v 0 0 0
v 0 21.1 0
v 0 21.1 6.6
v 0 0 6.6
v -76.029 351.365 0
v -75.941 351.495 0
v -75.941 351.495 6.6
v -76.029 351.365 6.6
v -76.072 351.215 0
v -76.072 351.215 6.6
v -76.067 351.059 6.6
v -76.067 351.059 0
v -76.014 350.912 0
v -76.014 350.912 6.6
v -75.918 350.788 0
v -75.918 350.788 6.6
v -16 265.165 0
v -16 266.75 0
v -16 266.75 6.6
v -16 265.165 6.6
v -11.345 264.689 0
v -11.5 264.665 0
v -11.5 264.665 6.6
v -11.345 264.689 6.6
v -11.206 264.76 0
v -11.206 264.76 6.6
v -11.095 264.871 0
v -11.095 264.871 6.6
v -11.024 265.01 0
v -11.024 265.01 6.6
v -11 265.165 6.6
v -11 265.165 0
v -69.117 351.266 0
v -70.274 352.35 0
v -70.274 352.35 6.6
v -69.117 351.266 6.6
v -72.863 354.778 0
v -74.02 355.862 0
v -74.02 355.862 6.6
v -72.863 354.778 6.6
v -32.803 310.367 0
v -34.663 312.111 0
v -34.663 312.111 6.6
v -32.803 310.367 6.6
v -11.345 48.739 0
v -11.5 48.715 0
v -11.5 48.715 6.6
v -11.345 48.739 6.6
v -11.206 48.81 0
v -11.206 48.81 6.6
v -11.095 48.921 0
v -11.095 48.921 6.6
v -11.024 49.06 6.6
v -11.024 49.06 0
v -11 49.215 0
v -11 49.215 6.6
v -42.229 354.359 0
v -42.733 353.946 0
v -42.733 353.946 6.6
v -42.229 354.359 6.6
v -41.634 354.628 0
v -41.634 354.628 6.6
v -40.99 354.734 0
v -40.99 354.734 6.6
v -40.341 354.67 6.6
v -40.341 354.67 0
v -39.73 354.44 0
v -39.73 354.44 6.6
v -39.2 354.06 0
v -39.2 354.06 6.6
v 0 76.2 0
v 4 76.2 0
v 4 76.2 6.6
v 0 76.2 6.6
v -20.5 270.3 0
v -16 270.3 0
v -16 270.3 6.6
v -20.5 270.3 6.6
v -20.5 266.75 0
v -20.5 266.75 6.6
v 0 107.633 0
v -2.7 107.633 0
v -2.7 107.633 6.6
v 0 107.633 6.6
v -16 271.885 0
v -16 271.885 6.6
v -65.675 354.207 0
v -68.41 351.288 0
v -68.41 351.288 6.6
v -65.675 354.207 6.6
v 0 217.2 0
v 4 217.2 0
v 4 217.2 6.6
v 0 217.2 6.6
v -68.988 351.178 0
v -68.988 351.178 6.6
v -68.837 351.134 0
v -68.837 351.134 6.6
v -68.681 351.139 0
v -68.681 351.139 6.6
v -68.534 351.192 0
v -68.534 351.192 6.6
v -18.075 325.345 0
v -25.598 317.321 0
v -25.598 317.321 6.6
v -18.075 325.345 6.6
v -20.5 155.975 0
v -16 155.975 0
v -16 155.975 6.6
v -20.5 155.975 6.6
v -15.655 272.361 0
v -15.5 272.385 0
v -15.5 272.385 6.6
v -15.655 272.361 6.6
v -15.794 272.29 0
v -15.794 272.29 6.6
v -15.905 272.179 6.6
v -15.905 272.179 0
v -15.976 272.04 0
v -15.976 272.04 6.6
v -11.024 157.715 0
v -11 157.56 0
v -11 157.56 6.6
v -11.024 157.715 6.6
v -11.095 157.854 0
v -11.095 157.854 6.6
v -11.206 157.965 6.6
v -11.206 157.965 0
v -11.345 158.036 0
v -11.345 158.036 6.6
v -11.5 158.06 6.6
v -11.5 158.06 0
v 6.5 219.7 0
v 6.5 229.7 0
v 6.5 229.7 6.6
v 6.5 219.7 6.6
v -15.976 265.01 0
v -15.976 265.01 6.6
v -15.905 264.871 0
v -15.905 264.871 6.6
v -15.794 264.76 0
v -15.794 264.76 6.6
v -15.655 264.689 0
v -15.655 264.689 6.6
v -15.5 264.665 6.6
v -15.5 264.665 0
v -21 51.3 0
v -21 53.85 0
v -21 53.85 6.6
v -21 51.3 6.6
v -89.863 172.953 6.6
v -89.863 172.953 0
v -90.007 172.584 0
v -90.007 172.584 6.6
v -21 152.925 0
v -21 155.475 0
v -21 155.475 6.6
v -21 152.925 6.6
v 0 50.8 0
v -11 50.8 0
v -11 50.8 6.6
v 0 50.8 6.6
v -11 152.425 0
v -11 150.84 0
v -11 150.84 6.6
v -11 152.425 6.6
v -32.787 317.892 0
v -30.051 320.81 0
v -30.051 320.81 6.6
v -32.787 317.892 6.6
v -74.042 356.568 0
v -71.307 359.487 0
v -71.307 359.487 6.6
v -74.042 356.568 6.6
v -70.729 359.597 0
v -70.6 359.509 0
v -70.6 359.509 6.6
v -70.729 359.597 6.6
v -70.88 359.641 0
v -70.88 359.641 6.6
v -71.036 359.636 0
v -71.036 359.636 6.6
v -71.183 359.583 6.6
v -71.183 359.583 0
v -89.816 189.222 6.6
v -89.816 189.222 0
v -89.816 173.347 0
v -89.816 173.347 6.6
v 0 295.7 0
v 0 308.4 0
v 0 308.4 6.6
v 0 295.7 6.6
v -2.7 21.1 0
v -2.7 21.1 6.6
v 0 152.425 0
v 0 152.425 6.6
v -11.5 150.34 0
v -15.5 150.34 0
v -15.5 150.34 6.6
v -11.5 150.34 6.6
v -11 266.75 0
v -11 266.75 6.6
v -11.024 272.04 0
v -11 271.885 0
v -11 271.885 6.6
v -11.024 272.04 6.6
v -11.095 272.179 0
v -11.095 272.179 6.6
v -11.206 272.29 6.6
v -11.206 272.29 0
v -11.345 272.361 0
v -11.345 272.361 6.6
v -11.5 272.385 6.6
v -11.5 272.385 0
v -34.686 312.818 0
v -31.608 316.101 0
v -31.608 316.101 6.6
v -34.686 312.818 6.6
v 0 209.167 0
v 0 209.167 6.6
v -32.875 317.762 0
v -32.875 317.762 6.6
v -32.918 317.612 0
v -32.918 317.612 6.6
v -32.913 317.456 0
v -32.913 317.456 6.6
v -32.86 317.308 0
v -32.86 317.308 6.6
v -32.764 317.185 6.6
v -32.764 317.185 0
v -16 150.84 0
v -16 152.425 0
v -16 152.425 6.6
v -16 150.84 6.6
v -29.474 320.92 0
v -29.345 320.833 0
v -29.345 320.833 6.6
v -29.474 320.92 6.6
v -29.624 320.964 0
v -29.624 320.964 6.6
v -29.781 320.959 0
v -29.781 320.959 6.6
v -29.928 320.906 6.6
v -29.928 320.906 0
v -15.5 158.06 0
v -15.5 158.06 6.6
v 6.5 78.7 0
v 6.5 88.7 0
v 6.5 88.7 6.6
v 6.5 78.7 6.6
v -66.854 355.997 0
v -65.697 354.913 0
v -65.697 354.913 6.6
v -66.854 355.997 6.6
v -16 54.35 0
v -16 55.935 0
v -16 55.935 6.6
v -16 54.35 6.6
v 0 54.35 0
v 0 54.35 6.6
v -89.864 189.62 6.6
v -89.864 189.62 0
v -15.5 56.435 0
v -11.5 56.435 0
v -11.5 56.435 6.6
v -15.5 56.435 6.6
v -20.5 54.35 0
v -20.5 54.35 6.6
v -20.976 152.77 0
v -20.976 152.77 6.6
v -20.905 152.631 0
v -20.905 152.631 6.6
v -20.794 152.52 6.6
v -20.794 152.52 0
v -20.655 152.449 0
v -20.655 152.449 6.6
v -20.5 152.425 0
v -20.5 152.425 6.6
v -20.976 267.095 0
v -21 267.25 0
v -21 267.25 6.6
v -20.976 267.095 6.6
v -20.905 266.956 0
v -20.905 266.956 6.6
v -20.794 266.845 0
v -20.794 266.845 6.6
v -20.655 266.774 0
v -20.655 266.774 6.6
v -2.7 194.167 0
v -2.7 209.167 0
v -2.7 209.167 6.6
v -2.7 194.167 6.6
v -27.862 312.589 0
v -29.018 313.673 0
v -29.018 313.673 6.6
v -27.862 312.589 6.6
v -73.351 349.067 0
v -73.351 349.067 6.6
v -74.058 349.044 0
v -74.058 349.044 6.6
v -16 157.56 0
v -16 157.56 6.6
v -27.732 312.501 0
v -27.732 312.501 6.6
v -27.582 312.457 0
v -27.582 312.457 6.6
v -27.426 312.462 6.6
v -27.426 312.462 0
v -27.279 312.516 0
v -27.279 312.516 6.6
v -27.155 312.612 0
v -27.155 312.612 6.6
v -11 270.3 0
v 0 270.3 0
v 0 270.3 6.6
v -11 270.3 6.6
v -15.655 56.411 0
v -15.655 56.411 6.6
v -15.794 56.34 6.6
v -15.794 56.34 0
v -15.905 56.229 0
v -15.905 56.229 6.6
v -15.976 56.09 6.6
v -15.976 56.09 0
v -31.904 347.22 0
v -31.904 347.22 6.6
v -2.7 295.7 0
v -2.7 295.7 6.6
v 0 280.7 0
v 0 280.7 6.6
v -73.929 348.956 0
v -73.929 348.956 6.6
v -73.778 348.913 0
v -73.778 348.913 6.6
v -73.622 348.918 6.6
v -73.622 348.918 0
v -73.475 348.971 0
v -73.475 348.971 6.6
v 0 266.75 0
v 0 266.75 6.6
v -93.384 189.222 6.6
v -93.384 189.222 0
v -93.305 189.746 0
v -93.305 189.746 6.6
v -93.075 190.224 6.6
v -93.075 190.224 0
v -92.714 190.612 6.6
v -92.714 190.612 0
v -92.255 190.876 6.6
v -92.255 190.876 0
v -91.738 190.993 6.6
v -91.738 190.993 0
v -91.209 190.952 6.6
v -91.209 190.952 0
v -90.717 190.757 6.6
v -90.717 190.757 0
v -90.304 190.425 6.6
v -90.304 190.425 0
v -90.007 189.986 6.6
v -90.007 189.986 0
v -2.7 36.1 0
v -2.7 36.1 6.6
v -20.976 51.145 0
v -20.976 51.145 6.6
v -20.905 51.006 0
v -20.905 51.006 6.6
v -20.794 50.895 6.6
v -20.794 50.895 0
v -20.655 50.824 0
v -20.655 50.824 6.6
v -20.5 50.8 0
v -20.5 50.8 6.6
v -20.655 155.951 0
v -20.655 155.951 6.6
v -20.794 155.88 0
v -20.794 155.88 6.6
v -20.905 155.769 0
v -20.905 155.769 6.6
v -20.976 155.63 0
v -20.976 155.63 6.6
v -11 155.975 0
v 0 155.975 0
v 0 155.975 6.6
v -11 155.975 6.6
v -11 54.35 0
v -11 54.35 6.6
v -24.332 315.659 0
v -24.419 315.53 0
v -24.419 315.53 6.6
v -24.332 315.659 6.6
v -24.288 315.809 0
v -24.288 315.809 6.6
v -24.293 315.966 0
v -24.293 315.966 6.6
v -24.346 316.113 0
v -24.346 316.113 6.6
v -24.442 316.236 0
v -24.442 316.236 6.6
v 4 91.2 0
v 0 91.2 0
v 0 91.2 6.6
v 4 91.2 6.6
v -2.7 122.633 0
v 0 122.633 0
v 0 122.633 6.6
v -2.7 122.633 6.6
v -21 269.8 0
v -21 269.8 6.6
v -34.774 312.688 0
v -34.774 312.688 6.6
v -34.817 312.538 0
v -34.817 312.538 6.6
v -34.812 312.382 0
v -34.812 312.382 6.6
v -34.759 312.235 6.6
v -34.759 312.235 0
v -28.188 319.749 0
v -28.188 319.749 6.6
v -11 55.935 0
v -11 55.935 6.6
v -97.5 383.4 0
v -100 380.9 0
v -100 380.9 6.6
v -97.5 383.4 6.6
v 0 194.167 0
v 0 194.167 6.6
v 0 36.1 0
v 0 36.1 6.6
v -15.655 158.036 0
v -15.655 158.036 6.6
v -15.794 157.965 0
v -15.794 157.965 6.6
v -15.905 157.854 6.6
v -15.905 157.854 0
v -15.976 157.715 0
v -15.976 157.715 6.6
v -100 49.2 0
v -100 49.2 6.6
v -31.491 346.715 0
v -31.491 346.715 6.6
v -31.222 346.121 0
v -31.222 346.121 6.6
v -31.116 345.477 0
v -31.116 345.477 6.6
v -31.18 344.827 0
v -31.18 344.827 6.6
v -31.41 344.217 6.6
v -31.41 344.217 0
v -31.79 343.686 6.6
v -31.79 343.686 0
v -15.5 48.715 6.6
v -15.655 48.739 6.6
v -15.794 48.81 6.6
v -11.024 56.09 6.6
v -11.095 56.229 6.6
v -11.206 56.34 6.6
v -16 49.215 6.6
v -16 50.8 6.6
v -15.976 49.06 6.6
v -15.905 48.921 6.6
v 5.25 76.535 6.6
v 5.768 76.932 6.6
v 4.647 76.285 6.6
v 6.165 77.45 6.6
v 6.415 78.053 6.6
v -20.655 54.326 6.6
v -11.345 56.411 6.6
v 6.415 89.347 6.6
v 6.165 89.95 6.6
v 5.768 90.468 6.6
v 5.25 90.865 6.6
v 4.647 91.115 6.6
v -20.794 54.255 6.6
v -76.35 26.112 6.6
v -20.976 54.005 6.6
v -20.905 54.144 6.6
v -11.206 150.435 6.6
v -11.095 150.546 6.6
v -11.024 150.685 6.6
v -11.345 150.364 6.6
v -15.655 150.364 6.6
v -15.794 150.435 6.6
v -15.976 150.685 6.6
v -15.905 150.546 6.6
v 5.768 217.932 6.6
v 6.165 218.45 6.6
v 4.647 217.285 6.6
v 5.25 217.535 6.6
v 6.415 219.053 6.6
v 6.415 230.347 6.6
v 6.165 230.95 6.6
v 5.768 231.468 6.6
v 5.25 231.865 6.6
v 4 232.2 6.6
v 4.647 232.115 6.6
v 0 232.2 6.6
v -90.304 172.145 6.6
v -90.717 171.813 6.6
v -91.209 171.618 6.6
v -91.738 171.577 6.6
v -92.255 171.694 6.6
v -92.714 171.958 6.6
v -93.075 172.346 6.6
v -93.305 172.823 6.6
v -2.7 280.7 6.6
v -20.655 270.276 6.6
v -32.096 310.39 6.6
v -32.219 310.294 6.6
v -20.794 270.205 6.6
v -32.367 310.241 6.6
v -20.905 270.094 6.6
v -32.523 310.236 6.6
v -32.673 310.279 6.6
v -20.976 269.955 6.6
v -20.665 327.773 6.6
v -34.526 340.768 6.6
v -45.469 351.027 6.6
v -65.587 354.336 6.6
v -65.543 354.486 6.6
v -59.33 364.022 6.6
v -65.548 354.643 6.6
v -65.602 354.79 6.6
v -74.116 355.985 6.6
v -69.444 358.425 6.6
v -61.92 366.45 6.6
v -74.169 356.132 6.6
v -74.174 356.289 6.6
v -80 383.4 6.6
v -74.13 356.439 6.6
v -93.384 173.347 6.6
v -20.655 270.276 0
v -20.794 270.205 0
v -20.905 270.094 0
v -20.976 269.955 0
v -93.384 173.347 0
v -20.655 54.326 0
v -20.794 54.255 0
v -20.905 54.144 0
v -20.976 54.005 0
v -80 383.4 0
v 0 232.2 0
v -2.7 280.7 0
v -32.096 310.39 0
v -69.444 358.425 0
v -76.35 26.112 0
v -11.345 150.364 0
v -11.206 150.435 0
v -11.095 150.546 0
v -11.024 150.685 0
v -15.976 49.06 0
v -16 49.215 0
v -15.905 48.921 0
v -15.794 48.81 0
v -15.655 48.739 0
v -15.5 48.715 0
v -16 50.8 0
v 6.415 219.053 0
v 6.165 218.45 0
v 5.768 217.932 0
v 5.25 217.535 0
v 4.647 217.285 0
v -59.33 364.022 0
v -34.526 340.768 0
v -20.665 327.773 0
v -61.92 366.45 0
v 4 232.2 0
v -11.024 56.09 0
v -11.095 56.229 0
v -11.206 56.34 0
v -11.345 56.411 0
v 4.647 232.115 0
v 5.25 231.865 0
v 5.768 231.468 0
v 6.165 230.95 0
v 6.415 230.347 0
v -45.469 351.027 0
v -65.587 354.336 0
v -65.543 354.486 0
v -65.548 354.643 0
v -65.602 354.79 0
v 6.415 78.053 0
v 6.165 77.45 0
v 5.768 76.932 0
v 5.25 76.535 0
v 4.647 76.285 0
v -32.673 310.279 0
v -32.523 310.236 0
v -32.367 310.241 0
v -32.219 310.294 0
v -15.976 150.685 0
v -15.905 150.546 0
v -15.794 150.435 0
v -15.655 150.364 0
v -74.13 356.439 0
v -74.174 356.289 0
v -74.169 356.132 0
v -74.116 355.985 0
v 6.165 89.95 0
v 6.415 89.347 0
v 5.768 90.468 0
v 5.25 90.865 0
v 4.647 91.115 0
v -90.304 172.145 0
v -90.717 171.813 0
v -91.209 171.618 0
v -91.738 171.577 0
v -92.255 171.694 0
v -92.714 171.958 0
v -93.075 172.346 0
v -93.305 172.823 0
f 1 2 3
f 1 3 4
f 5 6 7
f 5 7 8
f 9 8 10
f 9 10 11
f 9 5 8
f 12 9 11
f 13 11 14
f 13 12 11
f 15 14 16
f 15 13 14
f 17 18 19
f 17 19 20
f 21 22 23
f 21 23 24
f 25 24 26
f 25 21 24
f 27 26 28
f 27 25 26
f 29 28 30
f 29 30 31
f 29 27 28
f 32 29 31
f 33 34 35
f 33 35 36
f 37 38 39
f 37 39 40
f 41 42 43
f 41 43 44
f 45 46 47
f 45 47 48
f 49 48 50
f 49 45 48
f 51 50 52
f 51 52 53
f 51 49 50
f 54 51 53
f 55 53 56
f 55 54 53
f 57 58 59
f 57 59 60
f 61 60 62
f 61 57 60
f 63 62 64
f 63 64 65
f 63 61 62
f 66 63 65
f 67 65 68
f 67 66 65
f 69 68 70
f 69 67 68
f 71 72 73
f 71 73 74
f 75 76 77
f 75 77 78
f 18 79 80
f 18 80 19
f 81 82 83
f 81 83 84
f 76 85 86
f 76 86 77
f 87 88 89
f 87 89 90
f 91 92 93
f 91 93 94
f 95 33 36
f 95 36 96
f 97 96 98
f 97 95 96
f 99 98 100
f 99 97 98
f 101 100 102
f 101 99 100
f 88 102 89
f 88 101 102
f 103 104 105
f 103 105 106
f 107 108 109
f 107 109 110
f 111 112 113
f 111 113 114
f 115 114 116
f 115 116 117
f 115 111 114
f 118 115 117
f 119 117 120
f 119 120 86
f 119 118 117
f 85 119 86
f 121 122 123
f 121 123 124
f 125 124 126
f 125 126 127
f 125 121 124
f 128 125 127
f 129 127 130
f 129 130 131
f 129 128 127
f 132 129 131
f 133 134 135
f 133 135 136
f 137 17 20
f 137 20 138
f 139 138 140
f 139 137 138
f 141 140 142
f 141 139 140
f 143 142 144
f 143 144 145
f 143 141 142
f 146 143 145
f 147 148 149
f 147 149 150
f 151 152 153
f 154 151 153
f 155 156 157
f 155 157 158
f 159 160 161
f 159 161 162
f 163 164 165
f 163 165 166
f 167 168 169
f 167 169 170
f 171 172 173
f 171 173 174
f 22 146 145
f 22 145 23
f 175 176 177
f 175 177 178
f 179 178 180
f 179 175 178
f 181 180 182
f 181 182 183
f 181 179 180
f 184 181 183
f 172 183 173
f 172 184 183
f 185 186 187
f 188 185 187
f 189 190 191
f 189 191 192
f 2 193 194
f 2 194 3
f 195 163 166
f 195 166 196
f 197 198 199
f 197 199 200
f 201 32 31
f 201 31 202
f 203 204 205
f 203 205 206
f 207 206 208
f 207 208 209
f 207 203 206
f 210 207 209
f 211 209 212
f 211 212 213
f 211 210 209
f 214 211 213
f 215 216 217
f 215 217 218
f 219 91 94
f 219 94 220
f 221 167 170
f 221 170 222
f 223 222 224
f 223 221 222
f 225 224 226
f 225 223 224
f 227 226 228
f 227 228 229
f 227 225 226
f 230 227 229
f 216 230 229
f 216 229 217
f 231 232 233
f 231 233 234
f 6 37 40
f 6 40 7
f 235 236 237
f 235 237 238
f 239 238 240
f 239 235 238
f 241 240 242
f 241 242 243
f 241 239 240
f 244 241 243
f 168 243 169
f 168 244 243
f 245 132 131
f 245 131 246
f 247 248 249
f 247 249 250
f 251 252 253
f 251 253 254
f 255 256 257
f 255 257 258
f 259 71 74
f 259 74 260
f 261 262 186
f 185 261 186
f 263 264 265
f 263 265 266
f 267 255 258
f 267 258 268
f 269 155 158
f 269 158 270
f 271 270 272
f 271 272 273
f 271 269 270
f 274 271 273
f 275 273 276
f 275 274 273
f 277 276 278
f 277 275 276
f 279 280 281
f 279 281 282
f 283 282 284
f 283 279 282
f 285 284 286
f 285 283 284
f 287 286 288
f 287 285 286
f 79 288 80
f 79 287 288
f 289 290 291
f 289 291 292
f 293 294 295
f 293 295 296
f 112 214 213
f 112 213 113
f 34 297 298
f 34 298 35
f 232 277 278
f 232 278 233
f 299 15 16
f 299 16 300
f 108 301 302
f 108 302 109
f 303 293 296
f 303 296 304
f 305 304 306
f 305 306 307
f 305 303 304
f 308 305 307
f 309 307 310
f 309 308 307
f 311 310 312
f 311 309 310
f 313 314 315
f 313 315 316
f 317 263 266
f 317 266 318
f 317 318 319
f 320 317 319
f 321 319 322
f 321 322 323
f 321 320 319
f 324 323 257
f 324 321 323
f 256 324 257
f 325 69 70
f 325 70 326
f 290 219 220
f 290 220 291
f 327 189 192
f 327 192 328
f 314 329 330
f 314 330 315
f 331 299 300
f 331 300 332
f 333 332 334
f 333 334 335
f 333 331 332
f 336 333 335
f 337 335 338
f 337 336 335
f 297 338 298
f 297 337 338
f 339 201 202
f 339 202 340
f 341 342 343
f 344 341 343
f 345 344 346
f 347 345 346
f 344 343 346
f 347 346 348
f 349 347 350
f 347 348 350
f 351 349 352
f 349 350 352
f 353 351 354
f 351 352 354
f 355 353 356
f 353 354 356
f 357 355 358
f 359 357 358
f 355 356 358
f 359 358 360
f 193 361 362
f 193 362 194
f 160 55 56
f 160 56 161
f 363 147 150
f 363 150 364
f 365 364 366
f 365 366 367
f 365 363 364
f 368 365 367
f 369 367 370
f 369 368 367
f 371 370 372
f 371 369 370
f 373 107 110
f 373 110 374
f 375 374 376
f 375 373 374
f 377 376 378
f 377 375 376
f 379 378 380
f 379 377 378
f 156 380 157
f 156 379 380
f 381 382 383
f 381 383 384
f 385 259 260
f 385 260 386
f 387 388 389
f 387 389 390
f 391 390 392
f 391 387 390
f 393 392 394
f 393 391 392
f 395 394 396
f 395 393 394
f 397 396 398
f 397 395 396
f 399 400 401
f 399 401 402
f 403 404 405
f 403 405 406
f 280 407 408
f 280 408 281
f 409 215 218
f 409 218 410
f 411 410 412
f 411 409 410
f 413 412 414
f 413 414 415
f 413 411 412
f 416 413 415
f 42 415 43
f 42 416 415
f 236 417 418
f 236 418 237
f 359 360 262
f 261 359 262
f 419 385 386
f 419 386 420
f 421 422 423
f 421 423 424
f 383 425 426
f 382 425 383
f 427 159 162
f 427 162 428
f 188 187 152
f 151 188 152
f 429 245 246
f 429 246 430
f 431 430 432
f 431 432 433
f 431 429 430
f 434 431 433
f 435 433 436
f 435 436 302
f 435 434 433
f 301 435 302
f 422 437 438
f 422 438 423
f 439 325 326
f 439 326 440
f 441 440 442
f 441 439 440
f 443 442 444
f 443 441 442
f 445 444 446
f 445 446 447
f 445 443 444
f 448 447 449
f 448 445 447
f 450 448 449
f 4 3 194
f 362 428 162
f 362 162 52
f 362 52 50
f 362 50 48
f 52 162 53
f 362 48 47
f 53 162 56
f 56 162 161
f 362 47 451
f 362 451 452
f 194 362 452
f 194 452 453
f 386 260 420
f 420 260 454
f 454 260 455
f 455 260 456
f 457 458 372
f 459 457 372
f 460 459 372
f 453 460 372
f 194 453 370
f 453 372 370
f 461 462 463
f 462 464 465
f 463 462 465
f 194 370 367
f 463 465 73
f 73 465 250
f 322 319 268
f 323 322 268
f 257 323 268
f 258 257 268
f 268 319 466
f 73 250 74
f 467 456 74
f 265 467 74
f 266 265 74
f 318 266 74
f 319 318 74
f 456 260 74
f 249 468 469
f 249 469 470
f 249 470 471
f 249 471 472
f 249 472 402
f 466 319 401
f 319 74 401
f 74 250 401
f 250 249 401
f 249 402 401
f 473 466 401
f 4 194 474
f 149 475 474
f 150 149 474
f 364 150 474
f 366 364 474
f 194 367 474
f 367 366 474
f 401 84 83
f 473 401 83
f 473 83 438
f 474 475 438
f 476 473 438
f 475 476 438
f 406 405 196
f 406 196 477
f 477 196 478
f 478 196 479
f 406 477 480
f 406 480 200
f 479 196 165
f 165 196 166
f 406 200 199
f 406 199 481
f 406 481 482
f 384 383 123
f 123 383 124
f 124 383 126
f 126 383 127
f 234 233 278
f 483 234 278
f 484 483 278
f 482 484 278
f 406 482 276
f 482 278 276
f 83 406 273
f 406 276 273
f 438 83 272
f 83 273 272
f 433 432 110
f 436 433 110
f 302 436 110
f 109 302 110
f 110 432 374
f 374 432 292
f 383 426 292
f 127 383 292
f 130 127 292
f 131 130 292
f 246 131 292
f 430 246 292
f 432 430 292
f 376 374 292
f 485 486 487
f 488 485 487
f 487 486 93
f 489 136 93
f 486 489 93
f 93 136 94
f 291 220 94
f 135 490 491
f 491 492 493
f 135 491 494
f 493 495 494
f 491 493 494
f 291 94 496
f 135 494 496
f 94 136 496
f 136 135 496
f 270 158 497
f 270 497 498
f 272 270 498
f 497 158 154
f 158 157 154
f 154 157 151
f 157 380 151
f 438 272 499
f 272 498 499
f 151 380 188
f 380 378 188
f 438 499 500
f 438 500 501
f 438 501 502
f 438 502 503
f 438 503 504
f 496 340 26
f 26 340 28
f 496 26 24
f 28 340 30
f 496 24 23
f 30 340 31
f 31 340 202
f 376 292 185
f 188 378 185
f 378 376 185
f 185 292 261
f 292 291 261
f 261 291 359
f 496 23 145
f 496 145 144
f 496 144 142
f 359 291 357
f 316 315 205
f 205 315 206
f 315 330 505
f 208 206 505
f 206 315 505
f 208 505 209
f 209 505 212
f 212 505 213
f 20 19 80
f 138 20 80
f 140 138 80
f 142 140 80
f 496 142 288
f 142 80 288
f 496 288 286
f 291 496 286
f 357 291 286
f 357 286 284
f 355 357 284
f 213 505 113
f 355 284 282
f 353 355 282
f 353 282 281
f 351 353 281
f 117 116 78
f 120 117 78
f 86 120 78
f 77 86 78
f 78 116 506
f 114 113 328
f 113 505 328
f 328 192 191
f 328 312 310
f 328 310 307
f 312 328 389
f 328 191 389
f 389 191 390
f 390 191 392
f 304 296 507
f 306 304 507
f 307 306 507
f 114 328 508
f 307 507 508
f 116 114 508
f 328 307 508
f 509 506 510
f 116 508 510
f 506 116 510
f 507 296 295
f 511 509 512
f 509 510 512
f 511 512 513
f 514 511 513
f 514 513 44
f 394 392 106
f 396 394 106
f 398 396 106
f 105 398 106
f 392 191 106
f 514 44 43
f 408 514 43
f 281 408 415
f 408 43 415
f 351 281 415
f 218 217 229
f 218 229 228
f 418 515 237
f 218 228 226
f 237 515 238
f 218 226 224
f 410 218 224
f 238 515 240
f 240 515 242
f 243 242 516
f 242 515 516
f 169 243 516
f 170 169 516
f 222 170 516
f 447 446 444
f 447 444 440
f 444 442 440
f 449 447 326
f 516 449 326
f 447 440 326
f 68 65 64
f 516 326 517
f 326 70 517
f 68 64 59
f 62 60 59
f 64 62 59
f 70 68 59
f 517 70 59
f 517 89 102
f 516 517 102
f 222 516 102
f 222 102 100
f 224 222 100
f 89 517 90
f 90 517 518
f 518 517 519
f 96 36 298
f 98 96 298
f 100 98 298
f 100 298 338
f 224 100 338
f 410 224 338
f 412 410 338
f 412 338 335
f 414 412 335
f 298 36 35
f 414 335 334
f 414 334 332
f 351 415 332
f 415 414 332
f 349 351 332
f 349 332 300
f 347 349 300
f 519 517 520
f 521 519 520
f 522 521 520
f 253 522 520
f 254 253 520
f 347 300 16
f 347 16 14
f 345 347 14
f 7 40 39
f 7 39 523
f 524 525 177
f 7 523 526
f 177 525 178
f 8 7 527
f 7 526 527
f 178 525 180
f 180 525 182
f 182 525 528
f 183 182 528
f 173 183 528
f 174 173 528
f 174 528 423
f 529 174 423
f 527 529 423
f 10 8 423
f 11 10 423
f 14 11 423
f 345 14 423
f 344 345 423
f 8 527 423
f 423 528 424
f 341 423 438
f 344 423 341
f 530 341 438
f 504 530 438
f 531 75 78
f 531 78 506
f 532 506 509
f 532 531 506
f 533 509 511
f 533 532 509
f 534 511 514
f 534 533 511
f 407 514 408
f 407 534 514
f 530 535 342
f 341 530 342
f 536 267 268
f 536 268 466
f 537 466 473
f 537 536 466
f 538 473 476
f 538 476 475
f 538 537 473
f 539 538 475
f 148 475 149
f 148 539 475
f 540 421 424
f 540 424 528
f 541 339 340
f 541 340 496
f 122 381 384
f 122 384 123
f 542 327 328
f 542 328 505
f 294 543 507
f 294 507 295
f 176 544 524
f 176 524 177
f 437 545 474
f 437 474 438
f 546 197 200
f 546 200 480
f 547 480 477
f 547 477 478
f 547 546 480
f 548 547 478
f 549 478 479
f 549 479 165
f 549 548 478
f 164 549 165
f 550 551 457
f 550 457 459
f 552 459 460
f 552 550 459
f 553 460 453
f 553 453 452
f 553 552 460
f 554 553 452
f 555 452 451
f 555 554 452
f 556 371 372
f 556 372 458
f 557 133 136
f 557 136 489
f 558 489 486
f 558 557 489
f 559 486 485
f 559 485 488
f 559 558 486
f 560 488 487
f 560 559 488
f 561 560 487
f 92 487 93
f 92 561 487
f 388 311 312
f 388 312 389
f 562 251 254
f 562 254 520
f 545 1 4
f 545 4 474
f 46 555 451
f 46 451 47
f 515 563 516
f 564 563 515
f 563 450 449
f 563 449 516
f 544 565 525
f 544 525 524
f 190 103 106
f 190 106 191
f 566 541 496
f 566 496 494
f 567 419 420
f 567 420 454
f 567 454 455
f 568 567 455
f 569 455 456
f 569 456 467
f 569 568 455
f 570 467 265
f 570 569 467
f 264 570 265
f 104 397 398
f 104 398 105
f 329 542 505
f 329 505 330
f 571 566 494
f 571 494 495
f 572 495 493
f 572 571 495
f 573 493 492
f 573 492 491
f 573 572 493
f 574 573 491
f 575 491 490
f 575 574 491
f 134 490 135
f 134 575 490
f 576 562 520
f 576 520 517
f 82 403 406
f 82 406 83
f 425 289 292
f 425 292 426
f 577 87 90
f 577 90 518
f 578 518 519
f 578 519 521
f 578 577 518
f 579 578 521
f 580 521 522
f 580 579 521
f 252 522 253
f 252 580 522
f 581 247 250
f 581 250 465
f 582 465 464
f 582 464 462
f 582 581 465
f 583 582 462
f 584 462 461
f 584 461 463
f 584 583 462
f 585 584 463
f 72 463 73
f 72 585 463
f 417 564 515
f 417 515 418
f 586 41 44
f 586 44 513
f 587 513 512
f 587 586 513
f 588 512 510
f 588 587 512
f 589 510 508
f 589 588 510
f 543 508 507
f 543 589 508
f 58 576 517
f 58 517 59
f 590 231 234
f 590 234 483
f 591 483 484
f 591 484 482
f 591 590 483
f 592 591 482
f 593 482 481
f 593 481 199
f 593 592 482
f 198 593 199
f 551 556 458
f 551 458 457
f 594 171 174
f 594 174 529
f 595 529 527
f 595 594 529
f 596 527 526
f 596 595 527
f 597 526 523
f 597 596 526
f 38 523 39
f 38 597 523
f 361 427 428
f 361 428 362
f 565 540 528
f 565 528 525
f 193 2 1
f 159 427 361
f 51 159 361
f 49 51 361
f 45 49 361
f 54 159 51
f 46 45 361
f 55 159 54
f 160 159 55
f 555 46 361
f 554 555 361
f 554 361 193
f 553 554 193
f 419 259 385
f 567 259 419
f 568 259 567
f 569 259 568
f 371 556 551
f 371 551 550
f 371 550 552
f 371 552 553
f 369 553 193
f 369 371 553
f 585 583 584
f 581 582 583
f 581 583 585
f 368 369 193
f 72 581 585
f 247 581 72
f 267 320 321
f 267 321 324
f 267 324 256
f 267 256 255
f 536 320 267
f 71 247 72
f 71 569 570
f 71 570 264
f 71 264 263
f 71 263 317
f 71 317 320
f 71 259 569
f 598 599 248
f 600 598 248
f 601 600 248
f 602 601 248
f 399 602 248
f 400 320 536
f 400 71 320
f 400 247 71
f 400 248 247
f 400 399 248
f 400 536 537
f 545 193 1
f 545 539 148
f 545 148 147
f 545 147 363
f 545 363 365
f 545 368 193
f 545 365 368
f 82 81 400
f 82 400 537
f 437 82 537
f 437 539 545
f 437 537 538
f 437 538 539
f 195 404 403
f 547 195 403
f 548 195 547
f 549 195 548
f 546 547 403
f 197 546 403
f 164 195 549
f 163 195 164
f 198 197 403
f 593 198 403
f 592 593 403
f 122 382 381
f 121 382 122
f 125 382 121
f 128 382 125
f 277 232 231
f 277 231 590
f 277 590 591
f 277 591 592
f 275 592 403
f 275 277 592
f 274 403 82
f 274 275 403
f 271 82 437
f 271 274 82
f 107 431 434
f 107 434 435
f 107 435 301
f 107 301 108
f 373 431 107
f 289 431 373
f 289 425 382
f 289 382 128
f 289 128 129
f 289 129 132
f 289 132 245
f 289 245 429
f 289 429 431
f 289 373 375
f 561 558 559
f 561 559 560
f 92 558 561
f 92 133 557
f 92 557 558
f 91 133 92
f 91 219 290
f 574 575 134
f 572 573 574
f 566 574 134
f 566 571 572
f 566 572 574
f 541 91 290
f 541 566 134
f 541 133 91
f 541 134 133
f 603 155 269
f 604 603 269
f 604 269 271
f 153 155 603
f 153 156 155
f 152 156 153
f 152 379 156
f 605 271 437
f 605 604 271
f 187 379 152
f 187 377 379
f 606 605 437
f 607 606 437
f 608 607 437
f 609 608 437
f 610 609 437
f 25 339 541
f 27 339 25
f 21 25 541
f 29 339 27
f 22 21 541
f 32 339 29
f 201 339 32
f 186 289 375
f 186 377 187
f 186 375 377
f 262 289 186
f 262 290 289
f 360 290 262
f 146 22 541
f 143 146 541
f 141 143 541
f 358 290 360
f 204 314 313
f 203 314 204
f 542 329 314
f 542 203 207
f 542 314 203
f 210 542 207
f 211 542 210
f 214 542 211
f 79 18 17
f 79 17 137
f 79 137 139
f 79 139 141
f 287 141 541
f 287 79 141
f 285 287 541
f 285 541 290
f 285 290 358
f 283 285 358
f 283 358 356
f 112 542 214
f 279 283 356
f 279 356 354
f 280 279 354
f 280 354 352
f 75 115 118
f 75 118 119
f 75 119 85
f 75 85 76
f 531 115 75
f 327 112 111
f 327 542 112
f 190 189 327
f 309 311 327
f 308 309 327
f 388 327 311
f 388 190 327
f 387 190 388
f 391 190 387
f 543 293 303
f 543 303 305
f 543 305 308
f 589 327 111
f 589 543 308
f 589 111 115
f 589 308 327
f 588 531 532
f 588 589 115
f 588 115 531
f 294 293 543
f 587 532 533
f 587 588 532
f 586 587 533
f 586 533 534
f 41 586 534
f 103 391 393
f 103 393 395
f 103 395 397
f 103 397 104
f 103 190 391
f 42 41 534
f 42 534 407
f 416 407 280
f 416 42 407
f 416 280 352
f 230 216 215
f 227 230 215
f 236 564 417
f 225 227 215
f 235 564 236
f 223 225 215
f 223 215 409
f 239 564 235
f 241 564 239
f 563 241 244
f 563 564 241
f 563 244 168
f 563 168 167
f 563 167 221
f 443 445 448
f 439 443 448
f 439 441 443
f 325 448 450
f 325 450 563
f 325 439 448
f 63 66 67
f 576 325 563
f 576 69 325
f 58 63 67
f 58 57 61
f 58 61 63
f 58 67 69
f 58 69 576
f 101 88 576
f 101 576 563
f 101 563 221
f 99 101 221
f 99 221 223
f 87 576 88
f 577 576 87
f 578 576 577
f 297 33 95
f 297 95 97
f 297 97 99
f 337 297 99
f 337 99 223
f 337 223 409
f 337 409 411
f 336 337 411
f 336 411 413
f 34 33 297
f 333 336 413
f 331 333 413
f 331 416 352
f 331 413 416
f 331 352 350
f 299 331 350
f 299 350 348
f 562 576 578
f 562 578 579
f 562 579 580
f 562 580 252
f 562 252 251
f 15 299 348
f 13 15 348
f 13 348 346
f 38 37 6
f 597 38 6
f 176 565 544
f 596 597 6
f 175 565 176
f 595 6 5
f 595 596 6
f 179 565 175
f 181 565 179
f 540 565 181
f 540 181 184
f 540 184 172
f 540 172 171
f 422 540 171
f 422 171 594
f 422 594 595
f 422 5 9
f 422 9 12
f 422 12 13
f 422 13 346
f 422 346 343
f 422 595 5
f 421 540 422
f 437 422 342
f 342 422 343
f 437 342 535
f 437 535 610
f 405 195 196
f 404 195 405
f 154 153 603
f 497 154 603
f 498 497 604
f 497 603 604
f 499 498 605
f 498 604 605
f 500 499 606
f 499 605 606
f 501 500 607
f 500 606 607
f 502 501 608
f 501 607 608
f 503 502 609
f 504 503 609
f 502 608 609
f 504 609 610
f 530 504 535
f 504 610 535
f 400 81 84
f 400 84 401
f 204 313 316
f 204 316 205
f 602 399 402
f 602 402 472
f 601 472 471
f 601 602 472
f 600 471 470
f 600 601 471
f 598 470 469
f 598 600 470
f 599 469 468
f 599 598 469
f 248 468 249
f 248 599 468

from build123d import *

# Parameters (mm, degrees)
BOSS_EXTRUDE1_DEPTH = 6.6


with BuildPart() as part:
    # Model → Boss-Extrude1 (new body)
    with BuildSketch(Plane.XY):
        with BuildLine():
            Line((-2.7, 21.1), (0, 21.1))
            Line((0, 21.1), (0, 0))
            Line((0, 0), (-76.35, 26.1117))
            Line((-76.35, 26.1117), (-100, 49.2))
            Line((-100, 49.2), (-100, 380.9))
            Line((-100, 380.9), (-97.5, 383.4))
            Line((-97.5, 383.4), (-80, 383.4))
            Line((-80, 383.4), (-61.92031318, 366.450293606))
            Line((-61.92031318, 366.450293606), (-69.443665597, 358.42538436))
            Line((-69.443665597, 358.42538436), (-70.599982066, 359.50943105))
            ThreePointArc((-70.599982066, 359.50943105), (-70.958073277, 359.644402505), (-71.306721232, 359.486633012))
            Line((-71.306721232, 359.486633012), (-74.042485748, 356.568484196))
            ThreePointArc((-74.042485748, 356.568484196), (-74.177457203, 356.210392984), (-74.01968771, 355.861745029))
            Line((-74.01968771, 355.861745029), (-72.863371242, 354.77769834))
            Line((-72.863371242, 354.77769834), (-75.941106322, 351.494780921))
            ThreePointArc((-75.941106322, 351.494780921), (-76.076077777, 351.13668971), (-75.918308284, 350.788041755))
            Line((-75.918308284, 350.788041755), (-74.057988413, 349.043991876))
            ThreePointArc((-74.057988413, 349.043991876), (-73.699897202, 348.909020421), (-73.351249247, 349.066789913))
            Line((-73.351249247, 349.066789913), (-70.273514167, 352.349707332))
            Line((-70.273514167, 352.349707332), (-69.117197698, 351.265660643))
            ThreePointArc((-69.117197698, 351.265660643), (-68.759106487, 351.130689188), (-68.410458532, 351.288458681))
            Line((-68.410458532, 351.288458681), (-65.674694016, 354.206607497))
            ThreePointArc((-65.674694016, 354.206607497), (-65.539722561, 354.564698709), (-65.697492054, 354.913346664))
            Line((-65.697492054, 354.913346664), (-66.853808523, 355.997393353))
            Line((-66.853808523, 355.997393353), (-59.330456105, 364.022302598))
            Line((-59.330456105, 364.022302598), (-45.469249226, 351.02742115))
            Line((-45.469249226, 351.02742115), (-42.733484711, 353.945569966))
            ThreePointArc((-42.733484711, 353.945569966), (-40.990244935, 354.73441743), (-39.199788878, 354.059560154))
            Line((-39.199788878, 354.059560154), (-31.904416837, 347.220148866))
            ThreePointArc((-31.904416837, 347.220148866), (-31.115569373, 345.47690909), (-31.790426649, 343.686453033))
            Line((-31.790426649, 343.686453033), (-34.526191164, 340.768304216))
            Line((-34.526191164, 340.768304216), (-20.664984286, 327.773422768))
            Line((-20.664984286, 327.773422768), (-28.188336703, 319.748513522))
            Line((-28.188336703, 319.748513522), (-29.344653172, 320.832560211))
            ThreePointArc((-29.344653172, 320.832560211), (-29.702744383, 320.967531667), (-30.051392338, 320.809762174))
            Line((-30.051392338, 320.809762174), (-32.787156854, 317.891613357))
            ThreePointArc((-32.787156854, 317.891613357), (-32.922128309, 317.533522146), (-32.764358816, 317.184874191))
            Line((-32.764358816, 317.184874191), (-31.608042348, 316.100827502))
            Line((-31.608042348, 316.100827502), (-34.685777428, 312.817910083))
            ThreePointArc((-34.685777428, 312.817910083), (-34.820748883, 312.459818871), (-34.66297939, 312.111170916))
            Line((-34.66297939, 312.111170916), (-32.802659519, 310.367121038))
            ThreePointArc((-32.802659519, 310.367121038), (-32.444568308, 310.232149583), (-32.095920353, 310.389919075))
            Line((-32.095920353, 310.389919075), (-29.018185273, 313.672836494))
            Line((-29.018185273, 313.672836494), (-27.861868804, 312.588789805))
            ThreePointArc((-27.861868804, 312.588789805), (-27.503777593, 312.45381835), (-27.155129638, 312.611587842))
            Line((-27.155129638, 312.611587842), (-24.419365122, 315.529736659))
            ThreePointArc((-24.419365122, 315.529736659), (-24.284393667, 315.88782787), (-24.44216316, 316.236475825))
            Line((-24.44216316, 316.236475825), (-25.598479629, 317.320522515))
            Line((-25.598479629, 317.320522515), (-18.075127211, 325.34543176))
            Line((-18.075127211, 325.34543176), (0, 308.4))
            Line((0, 308.4), (0, 295.7))
            Line((0, 295.7), (-2.7, 295.7))
            Line((-2.7, 295.7), (-2.7, 280.7))
            Line((-2.7, 280.7), (0, 280.7))
            Line((0, 280.7), (0, 270.3))
            Line((0, 270.3), (-11, 270.3))
            Line((-11, 270.3), (-11, 271.885))
            ThreePointArc((-11, 271.885), (-11.146446609, 272.238553391), (-11.5, 272.385))
            Line((-11.5, 272.385), (-15.5, 272.385))
            ThreePointArc((-15.5, 272.385), (-15.853553391, 272.238553391), (-16, 271.885))
            Line((-16, 271.885), (-16, 270.3))
            Line((-16, 270.3), (-20.5, 270.3))
            ThreePointArc((-20.5, 270.3), (-20.853553391, 270.153553391), (-21, 269.8))
            Line((-21, 269.8), (-21, 267.25))
            ThreePointArc((-21, 267.25), (-20.853553391, 266.896446609), (-20.5, 266.75))
            Line((-20.5, 266.75), (-16, 266.75))
            Line((-16, 266.75), (-16, 265.165))
            ThreePointArc((-16, 265.165), (-15.853553391, 264.811446609), (-15.5, 264.665))
            Line((-15.5, 264.665), (-11.5, 264.665))
            ThreePointArc((-11.5, 264.665), (-11.146446609, 264.811446609), (-11, 265.165))
            Line((-11, 265.165), (-11, 266.75))
            Line((-11, 266.75), (0, 266.75))
            Line((0, 266.75), (0, 232.2))
            Line((0, 232.2), (4, 232.2))
            ThreePointArc((4, 232.2), (5.767766953, 231.467766953), (6.5, 229.7))
            Line((6.5, 229.7), (6.5, 219.7))
            ThreePointArc((6.5, 219.7), (5.767766953, 217.932233047), (4, 217.2))
            Line((4, 217.2), (0, 217.2))
            Line((0, 217.2), (0, 209.166666667))
            Line((0, 209.166666667), (-2.7, 209.166666667))
            Line((-2.7, 209.166666667), (-2.7, 194.166666667))
            Line((-2.7, 194.166666667), (0, 194.166666667))
            Line((0, 194.166666667), (0, 155.975))
            Line((0, 155.975), (-11, 155.975))
            Line((-11, 155.975), (-11, 157.56))
            ThreePointArc((-11, 157.56), (-11.146446609, 157.913553391), (-11.5, 158.06))
            Line((-11.5, 158.06), (-15.5, 158.06))
            ThreePointArc((-15.5, 158.06), (-15.853553391, 157.913553391), (-16, 157.56))
            Line((-16, 157.56), (-16, 155.975))
            Line((-16, 155.975), (-20.5, 155.975))
            ThreePointArc((-20.5, 155.975), (-20.853553391, 155.828553391), (-21, 155.475))
            Line((-21, 155.475), (-21, 152.925))
            ThreePointArc((-21, 152.925), (-20.853553391, 152.571446609), (-20.5, 152.425))
            Line((-20.5, 152.425), (-16, 152.425))
            Line((-16, 152.425), (-16, 150.84))
            ThreePointArc((-16, 150.84), (-15.853553391, 150.486446609), (-15.5, 150.34))
            Line((-15.5, 150.34), (-11.5, 150.34))
            ThreePointArc((-11.5, 150.34), (-11.146446609, 150.486446609), (-11, 150.84))
            Line((-11, 150.84), (-11, 152.425))
            Line((-11, 152.425), (0, 152.425))
            Line((0, 152.425), (0, 122.633333333))
            Line((0, 122.633333333), (-2.7, 122.633333333))
            Line((-2.7, 122.633333333), (-2.7, 107.633333333))
            Line((-2.7, 107.633333333), (0, 107.633333333))
            Line((0, 107.633333333), (0, 91.2))
            Line((0, 91.2), (4, 91.2))
            ThreePointArc((4, 91.2), (5.767766953, 90.467766953), (6.5, 88.7))
            Line((6.5, 88.7), (6.5, 78.7))
            ThreePointArc((6.5, 78.7), (5.767766953, 76.932233047), (4, 76.2))
            Line((4, 76.2), (0, 76.2))
            Line((0, 76.2), (0, 54.35))
            Line((0, 54.35), (-11, 54.35))
            Line((-11, 54.35), (-11, 55.935))
            ThreePointArc((-11, 55.935), (-11.146446609, 56.288553391), (-11.5, 56.435))
            Line((-11.5, 56.435), (-15.5, 56.435))
            ThreePointArc((-15.5, 56.435), (-15.853553391, 56.288553391), (-16, 55.935))
            Line((-16, 55.935), (-16, 54.35))
            Line((-16, 54.35), (-20.5, 54.35))
            ThreePointArc((-20.5, 54.35), (-20.853553391, 54.203553391), (-21, 53.85))
            Line((-21, 53.85), (-21, 51.3))
            ThreePointArc((-21, 51.3), (-20.853553391, 50.946446609), (-20.5, 50.8))
            Line((-20.5, 50.8), (-16, 50.8))
            Line((-16, 50.8), (-16, 49.215))
            ThreePointArc((-16, 49.215), (-15.853553391, 48.861446609), (-15.5, 48.715))
            Line((-15.5, 48.715), (-11.5, 48.715))
            ThreePointArc((-11.5, 48.715), (-11.146446609, 48.861446609), (-11, 49.215))
            Line((-11, 49.215), (-11, 50.8))
            Line((-11, 50.8), (0, 50.8))
            Line((0, 50.8), (0, 36.1))
            Line((0, 36.1), (-2.7, 36.1))
            Line((-2.7, 36.1), (-2.7, 21.1))
        make_face()
        with BuildLine():
            Line((-89.8155254, 173.347348004), (-89.86349893, 172.952628674))
            Line((-89.86349893, 172.952628674), (-90.006760381, 172.584057561))
            ThreePointArc((-90.006760381, 172.584057561), (-92.000532075, 171.616009494), (-93.384262393, 173.347348004))
            Line((-93.384262393, 173.347348004), (-93.384262393, 189.222348004))
            ThreePointArc((-93.384262393, 189.222348004), (-92.000532075, 190.953686513), (-90.006760381, 189.985638446))
            Line((-90.006760381, 189.985638446), (-89.864204346, 189.619898255))
            Line((-89.864204346, 189.619898255), (-89.8155254, 189.222348004))
            Line((-89.8155254, 189.222348004), (-89.8155254, 173.347348004))
        make_face(mode=Mode.SUBTRACT)
    extrude(amount=BOSS_EXTRUDE1_DEPTH)


solid = part.part
